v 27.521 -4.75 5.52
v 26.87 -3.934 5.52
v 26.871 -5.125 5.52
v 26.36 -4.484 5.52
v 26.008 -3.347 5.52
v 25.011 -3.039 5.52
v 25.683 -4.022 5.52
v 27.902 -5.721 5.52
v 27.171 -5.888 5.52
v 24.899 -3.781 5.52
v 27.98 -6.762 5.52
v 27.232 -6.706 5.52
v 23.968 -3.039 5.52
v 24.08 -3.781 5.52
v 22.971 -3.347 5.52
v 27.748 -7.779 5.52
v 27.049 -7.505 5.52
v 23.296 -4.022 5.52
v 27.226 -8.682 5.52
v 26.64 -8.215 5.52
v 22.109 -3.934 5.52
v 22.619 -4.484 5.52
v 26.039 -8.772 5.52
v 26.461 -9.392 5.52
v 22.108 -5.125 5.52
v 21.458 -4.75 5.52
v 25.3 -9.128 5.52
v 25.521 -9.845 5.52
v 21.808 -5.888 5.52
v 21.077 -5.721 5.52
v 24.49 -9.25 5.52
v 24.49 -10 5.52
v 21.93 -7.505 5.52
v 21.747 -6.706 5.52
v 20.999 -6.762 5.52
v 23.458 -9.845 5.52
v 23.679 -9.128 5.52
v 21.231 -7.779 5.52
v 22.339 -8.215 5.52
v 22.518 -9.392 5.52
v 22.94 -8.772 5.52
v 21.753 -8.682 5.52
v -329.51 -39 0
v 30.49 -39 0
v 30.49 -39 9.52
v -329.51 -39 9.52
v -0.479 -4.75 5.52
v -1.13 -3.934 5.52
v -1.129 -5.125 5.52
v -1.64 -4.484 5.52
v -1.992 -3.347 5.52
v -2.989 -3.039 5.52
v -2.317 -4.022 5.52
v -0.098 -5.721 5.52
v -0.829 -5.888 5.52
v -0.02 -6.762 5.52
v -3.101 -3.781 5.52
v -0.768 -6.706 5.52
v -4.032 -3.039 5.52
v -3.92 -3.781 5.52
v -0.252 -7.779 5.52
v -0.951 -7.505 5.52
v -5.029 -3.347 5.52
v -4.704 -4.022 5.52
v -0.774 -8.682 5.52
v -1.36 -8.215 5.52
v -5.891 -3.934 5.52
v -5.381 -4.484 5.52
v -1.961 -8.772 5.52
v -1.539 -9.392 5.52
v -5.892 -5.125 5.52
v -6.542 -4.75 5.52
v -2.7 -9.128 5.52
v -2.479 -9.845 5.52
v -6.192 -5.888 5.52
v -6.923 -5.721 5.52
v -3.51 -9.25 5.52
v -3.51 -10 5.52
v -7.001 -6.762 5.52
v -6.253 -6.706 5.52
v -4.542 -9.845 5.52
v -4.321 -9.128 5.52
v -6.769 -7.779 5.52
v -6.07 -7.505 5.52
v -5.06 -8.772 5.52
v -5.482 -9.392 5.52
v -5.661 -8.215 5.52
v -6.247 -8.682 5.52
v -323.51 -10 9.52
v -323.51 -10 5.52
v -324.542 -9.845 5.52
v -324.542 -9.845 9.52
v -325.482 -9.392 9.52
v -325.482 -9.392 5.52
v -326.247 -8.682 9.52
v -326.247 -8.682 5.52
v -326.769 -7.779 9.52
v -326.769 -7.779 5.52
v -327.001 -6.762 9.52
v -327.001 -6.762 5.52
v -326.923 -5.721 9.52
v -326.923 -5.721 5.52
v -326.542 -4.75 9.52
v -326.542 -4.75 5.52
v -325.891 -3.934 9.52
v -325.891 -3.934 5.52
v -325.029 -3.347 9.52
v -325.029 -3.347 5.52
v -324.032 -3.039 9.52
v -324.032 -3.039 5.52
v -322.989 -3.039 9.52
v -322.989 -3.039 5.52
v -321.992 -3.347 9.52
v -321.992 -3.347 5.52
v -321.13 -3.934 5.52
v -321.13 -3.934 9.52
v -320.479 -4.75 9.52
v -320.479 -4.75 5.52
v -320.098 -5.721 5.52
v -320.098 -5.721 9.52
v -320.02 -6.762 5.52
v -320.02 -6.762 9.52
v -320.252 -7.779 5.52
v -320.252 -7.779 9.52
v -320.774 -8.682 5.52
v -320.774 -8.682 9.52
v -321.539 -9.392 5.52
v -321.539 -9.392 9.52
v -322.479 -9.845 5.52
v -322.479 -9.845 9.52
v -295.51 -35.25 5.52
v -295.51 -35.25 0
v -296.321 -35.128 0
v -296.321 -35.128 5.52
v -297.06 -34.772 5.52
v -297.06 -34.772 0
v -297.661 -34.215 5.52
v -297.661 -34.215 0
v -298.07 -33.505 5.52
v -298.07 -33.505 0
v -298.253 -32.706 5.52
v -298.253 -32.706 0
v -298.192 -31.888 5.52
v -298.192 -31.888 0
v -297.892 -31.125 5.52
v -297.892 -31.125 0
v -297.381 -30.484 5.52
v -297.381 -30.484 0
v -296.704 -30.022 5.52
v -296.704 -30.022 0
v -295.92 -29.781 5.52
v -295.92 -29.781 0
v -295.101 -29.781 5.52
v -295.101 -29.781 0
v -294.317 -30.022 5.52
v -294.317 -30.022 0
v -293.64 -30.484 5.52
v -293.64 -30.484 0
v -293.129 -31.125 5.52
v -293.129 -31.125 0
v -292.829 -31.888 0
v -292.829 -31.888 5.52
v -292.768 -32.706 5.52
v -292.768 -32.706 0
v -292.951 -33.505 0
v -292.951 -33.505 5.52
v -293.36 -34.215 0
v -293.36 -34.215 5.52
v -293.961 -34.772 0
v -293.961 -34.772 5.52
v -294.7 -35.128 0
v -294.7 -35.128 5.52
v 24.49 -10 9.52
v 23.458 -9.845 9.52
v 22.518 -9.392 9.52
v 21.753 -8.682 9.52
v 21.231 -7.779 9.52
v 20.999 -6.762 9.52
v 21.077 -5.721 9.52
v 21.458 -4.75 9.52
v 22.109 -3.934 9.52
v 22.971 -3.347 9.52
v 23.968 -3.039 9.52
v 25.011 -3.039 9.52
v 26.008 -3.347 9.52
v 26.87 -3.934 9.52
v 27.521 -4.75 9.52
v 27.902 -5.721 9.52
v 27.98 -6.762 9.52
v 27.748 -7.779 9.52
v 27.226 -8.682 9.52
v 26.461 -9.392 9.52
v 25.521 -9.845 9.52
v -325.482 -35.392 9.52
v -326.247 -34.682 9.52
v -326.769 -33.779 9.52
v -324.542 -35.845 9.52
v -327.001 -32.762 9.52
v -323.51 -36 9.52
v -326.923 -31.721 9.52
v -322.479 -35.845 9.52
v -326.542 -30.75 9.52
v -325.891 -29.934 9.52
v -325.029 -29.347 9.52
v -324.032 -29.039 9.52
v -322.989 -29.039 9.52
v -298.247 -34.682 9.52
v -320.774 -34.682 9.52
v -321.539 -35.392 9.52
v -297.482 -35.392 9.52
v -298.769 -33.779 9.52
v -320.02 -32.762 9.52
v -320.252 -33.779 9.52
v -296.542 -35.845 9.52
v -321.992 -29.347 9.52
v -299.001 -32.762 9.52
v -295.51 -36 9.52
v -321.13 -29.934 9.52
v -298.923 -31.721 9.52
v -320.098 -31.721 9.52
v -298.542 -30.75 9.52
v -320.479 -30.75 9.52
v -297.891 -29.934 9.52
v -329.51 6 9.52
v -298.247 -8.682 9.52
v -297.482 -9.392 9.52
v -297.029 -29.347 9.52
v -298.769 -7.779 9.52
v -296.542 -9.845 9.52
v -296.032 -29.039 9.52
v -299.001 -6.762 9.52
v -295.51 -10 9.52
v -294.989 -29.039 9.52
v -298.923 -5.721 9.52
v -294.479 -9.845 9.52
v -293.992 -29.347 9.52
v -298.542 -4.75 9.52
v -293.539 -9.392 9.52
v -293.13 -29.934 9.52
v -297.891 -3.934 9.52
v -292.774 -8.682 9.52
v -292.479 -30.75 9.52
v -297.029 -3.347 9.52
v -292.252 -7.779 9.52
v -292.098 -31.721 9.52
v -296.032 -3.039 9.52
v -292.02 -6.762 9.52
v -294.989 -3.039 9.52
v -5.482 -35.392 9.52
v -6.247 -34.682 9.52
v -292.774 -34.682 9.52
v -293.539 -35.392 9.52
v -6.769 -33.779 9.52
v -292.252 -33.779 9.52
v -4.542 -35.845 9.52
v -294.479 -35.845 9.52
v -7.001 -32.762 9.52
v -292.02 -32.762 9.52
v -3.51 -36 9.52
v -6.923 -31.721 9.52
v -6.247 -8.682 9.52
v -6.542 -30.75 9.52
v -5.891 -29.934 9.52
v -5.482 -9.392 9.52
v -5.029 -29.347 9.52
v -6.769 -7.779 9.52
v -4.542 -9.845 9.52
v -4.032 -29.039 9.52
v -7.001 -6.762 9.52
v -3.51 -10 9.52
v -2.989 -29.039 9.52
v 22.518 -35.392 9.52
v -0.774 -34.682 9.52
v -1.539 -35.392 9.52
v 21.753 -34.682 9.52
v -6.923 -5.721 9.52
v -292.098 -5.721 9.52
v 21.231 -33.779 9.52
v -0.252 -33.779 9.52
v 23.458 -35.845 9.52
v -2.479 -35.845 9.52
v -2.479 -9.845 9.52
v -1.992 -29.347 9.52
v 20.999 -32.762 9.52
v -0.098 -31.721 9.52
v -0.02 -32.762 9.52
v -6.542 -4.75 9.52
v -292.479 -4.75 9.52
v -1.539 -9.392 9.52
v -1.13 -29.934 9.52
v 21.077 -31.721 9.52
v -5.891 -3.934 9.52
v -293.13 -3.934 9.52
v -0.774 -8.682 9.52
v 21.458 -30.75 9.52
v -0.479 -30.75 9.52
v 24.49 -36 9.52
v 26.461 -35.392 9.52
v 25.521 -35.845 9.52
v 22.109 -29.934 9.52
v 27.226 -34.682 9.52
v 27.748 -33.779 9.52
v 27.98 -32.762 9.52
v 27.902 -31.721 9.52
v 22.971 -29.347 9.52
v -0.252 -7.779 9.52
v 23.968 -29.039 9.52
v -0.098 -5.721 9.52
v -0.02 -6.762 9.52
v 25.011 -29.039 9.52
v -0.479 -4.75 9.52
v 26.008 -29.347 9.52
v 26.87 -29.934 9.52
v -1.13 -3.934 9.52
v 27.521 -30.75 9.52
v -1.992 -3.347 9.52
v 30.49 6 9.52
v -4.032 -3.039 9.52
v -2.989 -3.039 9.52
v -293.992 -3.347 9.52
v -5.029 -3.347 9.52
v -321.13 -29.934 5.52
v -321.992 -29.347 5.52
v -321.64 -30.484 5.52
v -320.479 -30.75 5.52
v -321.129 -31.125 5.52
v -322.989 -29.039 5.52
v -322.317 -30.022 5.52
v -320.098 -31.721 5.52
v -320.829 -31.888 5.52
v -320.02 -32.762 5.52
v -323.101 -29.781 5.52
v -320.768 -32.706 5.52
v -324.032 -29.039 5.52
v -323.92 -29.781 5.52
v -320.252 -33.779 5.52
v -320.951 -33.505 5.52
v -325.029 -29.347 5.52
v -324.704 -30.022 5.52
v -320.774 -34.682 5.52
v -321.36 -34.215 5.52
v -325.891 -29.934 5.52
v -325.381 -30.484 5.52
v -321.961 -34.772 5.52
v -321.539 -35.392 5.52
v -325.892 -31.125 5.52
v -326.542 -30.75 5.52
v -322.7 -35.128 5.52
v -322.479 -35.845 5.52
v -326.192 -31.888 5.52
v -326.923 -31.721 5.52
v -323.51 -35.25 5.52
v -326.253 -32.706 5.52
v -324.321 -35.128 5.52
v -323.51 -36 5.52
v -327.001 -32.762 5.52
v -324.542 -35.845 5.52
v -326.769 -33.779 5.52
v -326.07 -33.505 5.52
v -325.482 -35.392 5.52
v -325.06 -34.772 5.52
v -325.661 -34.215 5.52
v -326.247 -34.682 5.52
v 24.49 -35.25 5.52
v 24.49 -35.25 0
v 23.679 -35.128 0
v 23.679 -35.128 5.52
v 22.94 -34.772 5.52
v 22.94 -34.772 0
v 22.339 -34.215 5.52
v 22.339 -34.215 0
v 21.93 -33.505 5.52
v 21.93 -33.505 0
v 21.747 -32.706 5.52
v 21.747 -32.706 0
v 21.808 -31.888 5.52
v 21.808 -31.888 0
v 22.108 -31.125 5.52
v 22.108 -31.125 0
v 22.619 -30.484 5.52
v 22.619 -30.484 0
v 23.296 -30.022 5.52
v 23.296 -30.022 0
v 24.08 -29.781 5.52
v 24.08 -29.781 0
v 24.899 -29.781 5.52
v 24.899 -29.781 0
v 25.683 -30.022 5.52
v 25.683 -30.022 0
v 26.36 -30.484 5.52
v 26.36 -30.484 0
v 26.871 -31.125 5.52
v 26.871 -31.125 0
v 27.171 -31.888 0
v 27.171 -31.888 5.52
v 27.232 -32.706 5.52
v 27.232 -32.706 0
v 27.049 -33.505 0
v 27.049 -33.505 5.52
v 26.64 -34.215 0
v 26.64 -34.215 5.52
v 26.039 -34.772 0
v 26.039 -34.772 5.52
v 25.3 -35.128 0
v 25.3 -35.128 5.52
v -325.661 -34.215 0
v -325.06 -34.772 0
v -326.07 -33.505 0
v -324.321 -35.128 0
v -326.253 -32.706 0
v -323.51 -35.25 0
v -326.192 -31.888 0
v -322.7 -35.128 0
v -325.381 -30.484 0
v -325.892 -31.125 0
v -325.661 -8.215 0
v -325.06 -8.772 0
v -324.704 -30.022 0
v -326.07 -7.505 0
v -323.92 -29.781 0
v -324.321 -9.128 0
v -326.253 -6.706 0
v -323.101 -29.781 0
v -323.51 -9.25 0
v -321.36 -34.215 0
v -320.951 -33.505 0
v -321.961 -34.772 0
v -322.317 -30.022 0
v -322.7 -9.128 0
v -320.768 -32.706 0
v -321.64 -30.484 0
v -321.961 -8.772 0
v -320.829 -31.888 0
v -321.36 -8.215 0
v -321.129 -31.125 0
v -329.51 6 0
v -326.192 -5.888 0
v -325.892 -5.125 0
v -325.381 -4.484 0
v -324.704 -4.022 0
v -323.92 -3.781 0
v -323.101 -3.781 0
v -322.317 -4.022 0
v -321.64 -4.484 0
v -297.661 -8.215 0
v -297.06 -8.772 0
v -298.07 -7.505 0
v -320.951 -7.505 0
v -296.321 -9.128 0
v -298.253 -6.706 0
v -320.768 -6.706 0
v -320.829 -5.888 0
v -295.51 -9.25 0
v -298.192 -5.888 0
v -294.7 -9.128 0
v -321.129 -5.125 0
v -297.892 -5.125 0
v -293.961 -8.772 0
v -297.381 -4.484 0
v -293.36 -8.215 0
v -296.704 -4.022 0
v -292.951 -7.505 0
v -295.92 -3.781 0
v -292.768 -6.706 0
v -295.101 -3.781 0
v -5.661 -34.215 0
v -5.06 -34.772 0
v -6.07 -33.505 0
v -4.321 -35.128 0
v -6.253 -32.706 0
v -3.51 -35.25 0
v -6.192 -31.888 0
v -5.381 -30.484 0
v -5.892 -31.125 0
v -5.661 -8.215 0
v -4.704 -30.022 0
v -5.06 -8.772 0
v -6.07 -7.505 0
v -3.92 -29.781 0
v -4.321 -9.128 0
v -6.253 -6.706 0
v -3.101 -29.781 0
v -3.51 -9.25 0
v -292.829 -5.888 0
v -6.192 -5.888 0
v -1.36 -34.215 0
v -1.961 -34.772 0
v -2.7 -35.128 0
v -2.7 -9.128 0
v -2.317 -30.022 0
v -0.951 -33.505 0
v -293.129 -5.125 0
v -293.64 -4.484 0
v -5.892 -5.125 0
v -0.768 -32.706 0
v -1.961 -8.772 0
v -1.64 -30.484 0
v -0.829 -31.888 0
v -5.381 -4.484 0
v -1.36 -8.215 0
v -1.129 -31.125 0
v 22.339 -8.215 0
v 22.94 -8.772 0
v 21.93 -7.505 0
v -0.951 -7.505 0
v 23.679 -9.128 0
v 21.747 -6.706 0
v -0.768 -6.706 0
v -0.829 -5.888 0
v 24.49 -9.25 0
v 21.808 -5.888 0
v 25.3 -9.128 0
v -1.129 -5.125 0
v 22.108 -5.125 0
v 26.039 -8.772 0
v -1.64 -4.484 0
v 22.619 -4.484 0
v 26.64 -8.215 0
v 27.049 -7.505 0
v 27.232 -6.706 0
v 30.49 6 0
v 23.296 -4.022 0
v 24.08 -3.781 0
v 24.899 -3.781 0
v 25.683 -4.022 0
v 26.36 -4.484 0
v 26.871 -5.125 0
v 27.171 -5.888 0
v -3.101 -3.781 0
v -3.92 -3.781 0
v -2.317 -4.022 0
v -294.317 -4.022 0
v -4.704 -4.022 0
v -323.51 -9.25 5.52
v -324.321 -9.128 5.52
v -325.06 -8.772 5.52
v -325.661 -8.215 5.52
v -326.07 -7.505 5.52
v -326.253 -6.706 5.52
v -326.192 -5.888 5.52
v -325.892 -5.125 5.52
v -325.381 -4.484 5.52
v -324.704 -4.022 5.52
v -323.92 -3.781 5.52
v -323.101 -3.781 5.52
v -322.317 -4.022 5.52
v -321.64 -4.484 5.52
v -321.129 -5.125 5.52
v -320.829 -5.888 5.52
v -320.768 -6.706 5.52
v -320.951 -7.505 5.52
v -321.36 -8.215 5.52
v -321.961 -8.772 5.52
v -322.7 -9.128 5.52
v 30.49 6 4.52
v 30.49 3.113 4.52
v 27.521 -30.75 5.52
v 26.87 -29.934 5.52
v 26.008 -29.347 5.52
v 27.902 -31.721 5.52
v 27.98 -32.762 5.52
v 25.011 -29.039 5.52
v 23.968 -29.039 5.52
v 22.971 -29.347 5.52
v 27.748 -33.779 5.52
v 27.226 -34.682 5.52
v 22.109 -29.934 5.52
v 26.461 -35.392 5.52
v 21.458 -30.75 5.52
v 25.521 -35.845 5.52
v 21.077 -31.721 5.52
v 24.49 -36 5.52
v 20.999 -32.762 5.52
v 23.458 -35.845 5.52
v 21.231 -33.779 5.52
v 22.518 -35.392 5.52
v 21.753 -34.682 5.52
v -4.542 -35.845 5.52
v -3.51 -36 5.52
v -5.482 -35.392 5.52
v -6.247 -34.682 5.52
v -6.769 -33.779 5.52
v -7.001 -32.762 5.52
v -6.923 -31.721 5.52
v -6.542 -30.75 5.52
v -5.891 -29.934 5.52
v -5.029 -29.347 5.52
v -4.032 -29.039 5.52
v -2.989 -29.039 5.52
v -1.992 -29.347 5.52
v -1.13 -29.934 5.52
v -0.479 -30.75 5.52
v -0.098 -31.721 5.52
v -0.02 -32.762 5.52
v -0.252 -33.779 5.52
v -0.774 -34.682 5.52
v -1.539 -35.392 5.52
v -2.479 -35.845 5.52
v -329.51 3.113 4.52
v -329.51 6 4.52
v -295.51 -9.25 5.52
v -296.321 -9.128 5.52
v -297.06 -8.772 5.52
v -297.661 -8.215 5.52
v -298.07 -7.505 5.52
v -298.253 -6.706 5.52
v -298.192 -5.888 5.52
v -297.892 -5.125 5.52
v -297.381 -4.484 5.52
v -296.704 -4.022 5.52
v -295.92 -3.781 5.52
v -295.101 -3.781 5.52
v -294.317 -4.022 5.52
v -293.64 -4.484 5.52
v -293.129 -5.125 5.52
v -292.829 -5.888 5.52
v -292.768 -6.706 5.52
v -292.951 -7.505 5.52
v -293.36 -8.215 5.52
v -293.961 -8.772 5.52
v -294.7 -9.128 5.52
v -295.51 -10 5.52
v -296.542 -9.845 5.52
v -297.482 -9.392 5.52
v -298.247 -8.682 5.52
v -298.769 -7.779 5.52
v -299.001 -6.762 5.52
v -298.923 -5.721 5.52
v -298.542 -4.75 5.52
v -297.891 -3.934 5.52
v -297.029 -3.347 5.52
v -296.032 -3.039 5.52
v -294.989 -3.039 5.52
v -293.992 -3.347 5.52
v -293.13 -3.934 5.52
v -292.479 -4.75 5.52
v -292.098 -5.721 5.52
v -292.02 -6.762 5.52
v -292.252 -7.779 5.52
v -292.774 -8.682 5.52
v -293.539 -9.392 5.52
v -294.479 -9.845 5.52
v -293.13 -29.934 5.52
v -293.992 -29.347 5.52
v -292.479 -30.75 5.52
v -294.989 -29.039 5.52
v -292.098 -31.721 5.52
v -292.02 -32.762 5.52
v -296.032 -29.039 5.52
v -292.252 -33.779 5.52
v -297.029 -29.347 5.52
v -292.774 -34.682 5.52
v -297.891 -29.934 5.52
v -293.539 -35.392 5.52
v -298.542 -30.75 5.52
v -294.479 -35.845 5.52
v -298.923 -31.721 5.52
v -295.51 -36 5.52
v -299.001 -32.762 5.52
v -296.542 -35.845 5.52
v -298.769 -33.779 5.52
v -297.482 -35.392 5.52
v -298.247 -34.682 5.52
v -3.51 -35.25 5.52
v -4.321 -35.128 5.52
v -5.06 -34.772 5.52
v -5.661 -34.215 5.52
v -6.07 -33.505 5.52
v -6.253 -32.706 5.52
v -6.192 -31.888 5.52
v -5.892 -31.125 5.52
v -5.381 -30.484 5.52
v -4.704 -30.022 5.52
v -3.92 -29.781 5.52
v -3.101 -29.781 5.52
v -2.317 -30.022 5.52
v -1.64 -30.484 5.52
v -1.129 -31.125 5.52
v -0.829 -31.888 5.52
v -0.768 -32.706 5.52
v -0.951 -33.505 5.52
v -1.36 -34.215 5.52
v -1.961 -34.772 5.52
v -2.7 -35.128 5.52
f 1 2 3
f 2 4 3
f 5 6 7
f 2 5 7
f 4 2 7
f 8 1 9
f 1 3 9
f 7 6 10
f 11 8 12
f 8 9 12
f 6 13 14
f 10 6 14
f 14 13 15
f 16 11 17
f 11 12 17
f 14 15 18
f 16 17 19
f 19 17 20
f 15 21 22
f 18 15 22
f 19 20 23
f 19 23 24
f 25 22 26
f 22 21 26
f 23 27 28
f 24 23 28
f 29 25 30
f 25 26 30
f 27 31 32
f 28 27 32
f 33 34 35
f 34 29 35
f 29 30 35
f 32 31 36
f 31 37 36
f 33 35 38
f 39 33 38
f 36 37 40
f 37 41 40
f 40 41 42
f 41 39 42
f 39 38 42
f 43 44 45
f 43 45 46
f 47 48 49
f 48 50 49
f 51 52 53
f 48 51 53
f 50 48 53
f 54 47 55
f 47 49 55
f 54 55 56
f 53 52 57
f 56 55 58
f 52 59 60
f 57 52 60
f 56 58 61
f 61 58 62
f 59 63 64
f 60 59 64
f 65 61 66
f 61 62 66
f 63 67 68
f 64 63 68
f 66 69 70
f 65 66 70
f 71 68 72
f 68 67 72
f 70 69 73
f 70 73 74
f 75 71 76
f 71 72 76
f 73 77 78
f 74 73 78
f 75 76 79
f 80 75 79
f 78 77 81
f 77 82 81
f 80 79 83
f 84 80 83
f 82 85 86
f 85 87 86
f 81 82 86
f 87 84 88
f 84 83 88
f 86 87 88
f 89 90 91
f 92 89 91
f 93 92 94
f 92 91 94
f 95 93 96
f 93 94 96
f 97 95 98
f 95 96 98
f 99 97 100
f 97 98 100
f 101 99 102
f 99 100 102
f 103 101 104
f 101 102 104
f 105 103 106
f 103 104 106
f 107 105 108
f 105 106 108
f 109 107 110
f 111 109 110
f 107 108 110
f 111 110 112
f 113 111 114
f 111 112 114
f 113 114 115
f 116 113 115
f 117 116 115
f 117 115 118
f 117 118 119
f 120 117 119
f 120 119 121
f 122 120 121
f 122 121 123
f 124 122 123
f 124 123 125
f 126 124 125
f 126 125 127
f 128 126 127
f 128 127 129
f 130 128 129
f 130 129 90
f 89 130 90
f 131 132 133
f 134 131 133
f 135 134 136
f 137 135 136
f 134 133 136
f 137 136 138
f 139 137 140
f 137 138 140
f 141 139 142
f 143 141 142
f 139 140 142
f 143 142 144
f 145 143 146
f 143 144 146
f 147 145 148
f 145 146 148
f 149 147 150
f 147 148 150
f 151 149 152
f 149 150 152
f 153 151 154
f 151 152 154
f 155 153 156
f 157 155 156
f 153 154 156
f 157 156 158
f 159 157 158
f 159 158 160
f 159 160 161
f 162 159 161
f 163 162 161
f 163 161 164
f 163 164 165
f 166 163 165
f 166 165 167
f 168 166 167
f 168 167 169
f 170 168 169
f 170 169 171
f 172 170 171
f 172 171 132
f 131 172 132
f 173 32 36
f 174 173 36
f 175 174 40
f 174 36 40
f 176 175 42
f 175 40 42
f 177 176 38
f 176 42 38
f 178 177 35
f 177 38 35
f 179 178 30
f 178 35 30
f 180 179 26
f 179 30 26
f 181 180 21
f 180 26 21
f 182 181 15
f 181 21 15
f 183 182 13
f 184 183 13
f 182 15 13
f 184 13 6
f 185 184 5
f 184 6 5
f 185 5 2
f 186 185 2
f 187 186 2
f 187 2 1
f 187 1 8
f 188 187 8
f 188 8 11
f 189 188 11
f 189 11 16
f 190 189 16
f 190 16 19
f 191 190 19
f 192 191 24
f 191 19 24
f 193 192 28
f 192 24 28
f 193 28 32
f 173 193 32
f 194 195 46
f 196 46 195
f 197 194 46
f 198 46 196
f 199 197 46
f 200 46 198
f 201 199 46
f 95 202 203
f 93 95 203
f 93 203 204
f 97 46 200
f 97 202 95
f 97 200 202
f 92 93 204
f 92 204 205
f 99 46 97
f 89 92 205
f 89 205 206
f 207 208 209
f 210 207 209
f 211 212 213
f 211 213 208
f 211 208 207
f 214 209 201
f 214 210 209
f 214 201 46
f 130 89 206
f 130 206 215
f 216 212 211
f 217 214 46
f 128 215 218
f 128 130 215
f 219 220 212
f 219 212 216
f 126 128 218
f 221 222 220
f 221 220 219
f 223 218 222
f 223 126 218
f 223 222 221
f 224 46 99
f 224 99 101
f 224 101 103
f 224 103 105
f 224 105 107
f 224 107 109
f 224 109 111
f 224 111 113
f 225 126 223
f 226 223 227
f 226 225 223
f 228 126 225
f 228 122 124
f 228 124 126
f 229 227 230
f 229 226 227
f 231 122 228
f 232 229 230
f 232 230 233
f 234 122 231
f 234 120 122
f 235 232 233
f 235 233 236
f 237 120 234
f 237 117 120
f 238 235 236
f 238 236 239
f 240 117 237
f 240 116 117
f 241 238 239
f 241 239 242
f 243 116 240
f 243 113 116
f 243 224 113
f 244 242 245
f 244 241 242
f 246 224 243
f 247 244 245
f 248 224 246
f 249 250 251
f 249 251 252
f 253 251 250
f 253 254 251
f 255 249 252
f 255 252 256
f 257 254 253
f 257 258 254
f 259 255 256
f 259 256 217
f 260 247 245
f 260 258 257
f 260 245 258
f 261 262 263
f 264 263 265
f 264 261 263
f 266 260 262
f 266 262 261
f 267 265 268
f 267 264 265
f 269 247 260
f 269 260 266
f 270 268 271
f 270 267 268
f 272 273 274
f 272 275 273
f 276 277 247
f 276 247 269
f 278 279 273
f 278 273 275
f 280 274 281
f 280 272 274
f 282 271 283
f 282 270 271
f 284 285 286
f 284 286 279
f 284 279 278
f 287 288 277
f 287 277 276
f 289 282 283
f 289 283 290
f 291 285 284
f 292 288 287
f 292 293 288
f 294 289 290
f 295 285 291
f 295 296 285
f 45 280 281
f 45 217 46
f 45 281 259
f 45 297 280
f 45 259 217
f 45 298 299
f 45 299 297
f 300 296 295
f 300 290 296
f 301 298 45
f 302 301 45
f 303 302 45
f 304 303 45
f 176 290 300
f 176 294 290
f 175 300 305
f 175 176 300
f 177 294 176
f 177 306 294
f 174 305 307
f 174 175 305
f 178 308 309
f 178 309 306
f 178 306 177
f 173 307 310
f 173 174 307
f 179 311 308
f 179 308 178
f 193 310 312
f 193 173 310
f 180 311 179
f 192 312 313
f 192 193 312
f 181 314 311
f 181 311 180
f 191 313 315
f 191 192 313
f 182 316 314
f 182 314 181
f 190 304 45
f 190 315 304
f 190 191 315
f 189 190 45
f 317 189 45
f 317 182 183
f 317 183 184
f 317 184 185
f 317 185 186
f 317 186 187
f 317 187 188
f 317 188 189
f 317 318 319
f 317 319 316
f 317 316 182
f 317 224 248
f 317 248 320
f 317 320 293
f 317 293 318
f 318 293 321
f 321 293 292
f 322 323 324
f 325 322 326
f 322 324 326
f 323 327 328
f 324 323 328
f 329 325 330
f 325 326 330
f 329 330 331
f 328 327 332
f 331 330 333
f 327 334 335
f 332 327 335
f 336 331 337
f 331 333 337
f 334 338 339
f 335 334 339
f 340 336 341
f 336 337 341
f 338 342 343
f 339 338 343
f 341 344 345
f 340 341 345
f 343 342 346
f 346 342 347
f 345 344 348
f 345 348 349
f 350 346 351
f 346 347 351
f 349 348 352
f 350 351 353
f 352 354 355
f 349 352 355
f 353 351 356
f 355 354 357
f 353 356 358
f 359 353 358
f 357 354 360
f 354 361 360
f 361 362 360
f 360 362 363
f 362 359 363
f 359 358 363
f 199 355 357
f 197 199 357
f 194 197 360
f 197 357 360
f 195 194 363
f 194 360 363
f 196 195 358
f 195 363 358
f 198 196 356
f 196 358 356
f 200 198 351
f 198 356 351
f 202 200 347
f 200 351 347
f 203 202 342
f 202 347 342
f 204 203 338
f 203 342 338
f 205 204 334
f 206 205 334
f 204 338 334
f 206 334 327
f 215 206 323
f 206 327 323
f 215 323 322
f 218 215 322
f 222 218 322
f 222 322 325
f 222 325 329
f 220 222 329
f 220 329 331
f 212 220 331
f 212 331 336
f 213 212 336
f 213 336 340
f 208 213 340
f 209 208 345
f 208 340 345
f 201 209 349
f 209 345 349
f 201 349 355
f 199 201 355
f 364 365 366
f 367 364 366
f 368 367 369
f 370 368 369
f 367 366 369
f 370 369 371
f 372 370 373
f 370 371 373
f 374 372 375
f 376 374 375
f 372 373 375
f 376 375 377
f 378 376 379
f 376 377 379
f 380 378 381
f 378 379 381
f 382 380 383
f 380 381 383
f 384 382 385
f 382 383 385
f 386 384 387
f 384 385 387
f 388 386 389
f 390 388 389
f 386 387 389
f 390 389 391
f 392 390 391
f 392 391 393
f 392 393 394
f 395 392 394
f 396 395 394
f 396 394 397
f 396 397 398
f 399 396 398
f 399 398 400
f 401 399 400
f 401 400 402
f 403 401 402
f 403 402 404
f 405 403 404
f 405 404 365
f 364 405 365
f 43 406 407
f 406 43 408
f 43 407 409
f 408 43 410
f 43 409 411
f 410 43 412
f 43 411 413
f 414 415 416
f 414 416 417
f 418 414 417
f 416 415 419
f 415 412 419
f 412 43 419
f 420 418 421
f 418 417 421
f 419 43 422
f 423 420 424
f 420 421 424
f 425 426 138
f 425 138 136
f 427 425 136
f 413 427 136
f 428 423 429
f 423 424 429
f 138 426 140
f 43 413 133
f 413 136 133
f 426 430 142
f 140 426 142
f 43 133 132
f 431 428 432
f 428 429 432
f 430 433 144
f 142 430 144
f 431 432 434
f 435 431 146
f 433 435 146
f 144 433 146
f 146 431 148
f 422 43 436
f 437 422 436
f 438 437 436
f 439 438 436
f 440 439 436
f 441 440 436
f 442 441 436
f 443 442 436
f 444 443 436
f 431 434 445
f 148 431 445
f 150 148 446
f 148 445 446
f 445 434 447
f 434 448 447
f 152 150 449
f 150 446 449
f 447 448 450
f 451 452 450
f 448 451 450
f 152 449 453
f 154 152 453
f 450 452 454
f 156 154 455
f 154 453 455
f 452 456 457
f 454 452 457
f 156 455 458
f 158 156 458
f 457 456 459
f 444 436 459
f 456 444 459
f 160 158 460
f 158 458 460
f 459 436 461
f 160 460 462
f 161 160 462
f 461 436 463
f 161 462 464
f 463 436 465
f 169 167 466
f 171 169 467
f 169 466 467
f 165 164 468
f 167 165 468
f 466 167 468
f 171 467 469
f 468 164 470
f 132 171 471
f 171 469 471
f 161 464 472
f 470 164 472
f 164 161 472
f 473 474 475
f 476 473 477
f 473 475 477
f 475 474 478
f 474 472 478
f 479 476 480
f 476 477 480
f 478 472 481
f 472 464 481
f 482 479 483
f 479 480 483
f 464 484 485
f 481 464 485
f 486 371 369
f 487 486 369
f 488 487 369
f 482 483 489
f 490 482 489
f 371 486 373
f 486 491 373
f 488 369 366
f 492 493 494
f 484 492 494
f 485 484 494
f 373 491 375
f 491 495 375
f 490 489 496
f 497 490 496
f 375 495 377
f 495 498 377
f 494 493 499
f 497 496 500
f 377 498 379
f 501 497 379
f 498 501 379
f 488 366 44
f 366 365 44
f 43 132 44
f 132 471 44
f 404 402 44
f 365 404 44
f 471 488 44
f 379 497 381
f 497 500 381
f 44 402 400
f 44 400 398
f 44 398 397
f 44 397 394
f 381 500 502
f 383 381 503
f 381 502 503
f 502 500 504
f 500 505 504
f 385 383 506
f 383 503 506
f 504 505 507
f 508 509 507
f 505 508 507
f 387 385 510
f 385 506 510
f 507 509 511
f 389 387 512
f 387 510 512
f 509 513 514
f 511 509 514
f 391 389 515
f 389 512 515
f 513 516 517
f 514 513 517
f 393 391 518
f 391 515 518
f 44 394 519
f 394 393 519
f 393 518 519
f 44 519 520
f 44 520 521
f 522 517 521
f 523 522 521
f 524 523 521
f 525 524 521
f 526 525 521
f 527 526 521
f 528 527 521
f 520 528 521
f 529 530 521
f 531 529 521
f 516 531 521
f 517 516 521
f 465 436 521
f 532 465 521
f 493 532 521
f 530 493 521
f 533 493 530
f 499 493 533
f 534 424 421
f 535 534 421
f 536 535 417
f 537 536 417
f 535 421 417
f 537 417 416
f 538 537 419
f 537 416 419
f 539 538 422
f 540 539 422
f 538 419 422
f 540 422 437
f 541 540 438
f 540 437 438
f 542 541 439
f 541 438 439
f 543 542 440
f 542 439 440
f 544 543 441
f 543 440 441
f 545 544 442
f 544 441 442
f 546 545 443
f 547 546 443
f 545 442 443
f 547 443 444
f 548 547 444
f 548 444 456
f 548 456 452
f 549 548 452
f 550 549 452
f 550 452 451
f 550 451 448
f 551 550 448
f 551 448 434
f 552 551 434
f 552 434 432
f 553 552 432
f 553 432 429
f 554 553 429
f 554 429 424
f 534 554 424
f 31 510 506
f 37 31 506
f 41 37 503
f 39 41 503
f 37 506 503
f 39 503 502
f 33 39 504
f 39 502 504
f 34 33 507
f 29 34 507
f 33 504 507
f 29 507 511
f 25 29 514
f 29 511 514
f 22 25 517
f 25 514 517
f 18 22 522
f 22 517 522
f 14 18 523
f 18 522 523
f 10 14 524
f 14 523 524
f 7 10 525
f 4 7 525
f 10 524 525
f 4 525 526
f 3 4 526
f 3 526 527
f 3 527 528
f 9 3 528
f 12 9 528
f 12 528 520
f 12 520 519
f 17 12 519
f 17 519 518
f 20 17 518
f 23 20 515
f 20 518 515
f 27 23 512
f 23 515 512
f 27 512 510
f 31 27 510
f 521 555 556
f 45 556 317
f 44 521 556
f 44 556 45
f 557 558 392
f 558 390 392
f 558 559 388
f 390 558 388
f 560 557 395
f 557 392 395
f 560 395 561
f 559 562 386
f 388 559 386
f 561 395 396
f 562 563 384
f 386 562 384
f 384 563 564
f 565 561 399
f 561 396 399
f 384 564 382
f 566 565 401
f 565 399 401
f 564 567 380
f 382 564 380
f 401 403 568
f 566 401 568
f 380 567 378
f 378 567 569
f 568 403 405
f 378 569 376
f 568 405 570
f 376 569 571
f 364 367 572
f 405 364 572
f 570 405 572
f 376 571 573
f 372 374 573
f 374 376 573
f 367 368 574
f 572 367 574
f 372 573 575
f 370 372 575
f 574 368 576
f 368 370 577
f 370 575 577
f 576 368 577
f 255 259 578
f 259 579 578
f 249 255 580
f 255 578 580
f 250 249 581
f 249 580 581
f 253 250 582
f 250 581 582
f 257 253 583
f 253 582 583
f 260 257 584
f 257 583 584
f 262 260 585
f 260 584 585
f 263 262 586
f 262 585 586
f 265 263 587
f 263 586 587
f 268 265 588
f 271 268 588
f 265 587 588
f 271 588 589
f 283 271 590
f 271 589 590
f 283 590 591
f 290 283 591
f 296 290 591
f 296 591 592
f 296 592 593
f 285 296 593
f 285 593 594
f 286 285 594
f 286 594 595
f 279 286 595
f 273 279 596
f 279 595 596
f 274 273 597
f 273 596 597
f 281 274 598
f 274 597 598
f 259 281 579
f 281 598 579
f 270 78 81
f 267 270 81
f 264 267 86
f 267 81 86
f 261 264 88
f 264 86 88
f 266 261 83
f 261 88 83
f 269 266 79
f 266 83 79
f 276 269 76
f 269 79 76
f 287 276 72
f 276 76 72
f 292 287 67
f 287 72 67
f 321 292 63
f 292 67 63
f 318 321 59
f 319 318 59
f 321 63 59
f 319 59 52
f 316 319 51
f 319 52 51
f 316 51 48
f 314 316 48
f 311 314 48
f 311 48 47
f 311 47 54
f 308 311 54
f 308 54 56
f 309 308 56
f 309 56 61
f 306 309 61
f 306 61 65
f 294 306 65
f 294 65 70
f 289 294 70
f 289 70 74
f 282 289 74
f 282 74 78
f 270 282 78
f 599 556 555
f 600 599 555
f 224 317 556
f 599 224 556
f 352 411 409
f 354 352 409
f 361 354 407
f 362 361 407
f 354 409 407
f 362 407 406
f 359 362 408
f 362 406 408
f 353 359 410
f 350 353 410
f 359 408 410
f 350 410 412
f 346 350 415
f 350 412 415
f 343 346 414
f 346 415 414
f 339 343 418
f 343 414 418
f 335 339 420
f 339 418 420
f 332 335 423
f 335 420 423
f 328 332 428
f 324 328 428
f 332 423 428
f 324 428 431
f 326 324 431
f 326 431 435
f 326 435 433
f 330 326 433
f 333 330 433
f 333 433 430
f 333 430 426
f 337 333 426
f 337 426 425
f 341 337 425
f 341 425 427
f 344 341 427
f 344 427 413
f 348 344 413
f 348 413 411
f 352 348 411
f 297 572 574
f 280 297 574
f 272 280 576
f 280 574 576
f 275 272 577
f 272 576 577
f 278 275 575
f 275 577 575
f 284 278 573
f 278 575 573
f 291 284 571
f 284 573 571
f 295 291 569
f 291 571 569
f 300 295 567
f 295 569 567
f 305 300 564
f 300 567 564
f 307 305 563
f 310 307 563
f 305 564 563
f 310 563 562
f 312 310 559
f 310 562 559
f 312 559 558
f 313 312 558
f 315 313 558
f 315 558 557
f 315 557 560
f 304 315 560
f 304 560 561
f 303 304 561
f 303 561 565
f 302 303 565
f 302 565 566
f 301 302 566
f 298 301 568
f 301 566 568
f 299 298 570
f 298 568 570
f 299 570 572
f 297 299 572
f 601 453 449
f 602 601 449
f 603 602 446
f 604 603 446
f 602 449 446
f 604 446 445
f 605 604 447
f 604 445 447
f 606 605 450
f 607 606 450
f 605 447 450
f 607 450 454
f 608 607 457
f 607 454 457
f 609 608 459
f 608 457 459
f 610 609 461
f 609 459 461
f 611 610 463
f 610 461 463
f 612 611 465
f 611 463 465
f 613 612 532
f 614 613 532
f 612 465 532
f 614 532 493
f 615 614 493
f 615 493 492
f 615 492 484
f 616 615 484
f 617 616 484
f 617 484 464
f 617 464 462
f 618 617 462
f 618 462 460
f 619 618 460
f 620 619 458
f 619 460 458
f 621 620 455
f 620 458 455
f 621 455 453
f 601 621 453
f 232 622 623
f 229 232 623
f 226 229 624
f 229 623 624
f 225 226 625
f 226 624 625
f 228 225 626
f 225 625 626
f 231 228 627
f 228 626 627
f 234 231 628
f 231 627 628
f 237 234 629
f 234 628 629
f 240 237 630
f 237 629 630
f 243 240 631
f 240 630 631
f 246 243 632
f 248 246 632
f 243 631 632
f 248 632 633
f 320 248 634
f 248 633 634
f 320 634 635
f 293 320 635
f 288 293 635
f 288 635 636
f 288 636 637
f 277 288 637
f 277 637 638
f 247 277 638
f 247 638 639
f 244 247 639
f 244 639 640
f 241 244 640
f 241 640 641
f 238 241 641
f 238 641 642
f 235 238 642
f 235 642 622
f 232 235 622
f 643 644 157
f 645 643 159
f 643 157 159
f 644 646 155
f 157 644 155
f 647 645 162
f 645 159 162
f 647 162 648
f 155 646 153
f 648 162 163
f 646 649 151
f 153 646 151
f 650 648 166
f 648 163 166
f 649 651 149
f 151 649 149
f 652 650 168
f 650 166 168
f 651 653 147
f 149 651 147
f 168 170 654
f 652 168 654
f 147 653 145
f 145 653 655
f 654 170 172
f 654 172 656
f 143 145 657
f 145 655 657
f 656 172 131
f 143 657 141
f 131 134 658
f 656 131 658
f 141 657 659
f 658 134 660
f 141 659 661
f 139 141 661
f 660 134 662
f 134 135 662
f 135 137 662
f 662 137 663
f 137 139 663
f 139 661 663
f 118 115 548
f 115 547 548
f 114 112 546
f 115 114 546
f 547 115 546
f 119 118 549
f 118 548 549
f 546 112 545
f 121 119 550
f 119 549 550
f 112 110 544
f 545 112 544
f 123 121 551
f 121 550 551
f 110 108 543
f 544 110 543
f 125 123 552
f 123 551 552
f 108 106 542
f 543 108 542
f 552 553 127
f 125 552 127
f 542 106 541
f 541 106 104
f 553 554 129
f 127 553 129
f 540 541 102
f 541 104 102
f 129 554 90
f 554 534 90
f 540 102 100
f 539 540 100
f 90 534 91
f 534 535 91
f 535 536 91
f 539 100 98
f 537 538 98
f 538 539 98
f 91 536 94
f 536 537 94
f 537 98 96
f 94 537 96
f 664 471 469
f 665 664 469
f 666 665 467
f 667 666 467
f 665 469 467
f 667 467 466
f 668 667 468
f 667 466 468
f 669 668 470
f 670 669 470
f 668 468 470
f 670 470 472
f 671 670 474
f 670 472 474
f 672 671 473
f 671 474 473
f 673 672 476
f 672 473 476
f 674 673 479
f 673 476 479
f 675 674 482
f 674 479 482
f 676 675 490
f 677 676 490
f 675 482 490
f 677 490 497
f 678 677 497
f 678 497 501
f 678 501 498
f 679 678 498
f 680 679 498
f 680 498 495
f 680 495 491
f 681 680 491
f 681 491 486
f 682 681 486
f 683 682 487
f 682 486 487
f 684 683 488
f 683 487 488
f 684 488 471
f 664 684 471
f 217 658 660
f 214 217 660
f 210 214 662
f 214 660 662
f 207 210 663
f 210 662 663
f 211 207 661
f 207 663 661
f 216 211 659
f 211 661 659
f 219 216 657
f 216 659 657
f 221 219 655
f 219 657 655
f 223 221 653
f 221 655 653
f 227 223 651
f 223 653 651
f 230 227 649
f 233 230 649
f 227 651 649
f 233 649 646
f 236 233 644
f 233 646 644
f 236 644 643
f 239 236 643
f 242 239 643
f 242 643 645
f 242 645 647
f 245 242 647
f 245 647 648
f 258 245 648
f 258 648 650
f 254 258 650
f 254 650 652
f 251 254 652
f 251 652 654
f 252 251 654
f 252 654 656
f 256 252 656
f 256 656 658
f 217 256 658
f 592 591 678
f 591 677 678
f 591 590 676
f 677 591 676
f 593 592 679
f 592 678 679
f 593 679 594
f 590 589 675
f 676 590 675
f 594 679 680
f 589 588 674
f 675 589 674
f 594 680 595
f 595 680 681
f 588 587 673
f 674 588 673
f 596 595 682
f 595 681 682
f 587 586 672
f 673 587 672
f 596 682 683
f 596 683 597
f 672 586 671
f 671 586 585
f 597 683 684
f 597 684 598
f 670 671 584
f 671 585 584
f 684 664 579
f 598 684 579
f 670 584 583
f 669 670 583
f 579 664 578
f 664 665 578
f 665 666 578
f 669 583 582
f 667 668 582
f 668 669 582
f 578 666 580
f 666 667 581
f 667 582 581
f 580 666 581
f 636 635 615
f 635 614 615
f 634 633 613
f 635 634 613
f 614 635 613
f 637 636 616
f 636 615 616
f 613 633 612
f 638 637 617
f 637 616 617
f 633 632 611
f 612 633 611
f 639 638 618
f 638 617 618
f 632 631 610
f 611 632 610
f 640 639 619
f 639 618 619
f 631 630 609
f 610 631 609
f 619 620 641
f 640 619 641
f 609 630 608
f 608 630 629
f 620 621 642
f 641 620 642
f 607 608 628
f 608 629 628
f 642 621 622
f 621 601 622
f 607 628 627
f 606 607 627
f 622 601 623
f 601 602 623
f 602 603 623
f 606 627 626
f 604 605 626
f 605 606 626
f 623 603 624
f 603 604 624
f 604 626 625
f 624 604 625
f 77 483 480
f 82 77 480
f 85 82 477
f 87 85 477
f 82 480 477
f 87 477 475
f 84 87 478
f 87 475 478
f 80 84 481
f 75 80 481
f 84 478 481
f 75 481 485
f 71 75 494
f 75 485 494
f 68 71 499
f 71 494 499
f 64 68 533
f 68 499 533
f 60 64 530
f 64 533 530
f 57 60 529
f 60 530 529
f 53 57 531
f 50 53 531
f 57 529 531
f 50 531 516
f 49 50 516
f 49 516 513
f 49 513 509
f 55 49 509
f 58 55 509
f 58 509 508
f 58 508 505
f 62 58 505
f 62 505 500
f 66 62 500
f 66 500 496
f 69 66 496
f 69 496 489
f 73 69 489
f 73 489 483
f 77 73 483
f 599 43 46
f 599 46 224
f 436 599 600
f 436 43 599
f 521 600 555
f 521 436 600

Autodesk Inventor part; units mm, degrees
ref_plane "YZ Plane" through (0, 0, 0) normal (1, 0, 0) x (0, 1, 0)
ref_plane "XZ Plane" through (0, 0, 0) normal (0, 1, 0) x (-1, 0, 0)
ref_plane "XY Plane" through (0, 0, 0) normal (0, 0, 1) x (1, 0, 0)
sketch "Esboço1" plane through (0, 0, 0) normal (0, 0, 1) x (1, 0, 0)
  line L0 (30.4895, -39) -> (-329.5105, -39)
  line L1 (-329.5105, -39) -> (-329.5105, 6)
  line L2 (-329.5105, 6) -> (30.4895, 6)
  line L3 (30.4895, 6) -> (30.4895, -39)
  point P0 (0, 0)
  point P1 (-329.5105, 0)
  dimension "d0" = 45
extrude "Extrusão1" add sketch "Esboço1" along normal blind 9.52
sketch "Esboço2" plane through (0, 0, 9.52) normal (0, 0, 1) x (1, 0, 0)
  circle A0 centre (24.4895, -32.5) radius 2.067 projected
  circle A1 centre (24.4895, -6.5) radius 2.067 projected
  circle A2 centre (-3.5105, -6.5) radius 2.067 projected
  circle A3 centre (-3.5105, -32.5) radius 2.067 projected
  circle A4 centre (-323.5105, -32.5) radius 2.067 projected
  circle A5 centre (-295.5105, -32.5) radius 2.067 projected
  circle A6 centre (-295.5105, -6.5) radius 2.067 projected
  circle A7 centre (-323.5105, -6.5) radius 2.067 projected
  point P0 (0, 0)
hole "Furo1" at (24.4895, -32.5, 9.52) at (-3.5105, -32.5, 9.52) at (-3.5105, -6.5, 9.52) at (24.4895, -6.5, 9.52) at (-323.5105, -32.5, 9.52) at (-295.5105, -32.5, 9.52) at (-295.5105, -6.5, 9.52) at (-323.5105, -6.5, 9.52) direction (0, 0, -1) diameter 5.5 end through all counterbore diameter 7 counterbore depth 4
sketch "Esboço3" plane through (30.4895, -39, 0) normal (1, 0, 0) x (0, 0, -1)
  line L0 (0, 45) -> (-9.52, 45) projected
  line L1 (-9.52, 45) -> (-4.52, 42.1132)
  line L2 (-9.52, 45) -> (-3.7465, 45) construction
  line L3 (-4.52, 42.1132) -> (-4.52, 45)
  point P0 (0, 39)
  dimension "d10" = 30
  dimension "d13" = 5
extrude "Extrusão2" cut sketch "Esboço3" against normal through all
properties part number "SuportePincas"
